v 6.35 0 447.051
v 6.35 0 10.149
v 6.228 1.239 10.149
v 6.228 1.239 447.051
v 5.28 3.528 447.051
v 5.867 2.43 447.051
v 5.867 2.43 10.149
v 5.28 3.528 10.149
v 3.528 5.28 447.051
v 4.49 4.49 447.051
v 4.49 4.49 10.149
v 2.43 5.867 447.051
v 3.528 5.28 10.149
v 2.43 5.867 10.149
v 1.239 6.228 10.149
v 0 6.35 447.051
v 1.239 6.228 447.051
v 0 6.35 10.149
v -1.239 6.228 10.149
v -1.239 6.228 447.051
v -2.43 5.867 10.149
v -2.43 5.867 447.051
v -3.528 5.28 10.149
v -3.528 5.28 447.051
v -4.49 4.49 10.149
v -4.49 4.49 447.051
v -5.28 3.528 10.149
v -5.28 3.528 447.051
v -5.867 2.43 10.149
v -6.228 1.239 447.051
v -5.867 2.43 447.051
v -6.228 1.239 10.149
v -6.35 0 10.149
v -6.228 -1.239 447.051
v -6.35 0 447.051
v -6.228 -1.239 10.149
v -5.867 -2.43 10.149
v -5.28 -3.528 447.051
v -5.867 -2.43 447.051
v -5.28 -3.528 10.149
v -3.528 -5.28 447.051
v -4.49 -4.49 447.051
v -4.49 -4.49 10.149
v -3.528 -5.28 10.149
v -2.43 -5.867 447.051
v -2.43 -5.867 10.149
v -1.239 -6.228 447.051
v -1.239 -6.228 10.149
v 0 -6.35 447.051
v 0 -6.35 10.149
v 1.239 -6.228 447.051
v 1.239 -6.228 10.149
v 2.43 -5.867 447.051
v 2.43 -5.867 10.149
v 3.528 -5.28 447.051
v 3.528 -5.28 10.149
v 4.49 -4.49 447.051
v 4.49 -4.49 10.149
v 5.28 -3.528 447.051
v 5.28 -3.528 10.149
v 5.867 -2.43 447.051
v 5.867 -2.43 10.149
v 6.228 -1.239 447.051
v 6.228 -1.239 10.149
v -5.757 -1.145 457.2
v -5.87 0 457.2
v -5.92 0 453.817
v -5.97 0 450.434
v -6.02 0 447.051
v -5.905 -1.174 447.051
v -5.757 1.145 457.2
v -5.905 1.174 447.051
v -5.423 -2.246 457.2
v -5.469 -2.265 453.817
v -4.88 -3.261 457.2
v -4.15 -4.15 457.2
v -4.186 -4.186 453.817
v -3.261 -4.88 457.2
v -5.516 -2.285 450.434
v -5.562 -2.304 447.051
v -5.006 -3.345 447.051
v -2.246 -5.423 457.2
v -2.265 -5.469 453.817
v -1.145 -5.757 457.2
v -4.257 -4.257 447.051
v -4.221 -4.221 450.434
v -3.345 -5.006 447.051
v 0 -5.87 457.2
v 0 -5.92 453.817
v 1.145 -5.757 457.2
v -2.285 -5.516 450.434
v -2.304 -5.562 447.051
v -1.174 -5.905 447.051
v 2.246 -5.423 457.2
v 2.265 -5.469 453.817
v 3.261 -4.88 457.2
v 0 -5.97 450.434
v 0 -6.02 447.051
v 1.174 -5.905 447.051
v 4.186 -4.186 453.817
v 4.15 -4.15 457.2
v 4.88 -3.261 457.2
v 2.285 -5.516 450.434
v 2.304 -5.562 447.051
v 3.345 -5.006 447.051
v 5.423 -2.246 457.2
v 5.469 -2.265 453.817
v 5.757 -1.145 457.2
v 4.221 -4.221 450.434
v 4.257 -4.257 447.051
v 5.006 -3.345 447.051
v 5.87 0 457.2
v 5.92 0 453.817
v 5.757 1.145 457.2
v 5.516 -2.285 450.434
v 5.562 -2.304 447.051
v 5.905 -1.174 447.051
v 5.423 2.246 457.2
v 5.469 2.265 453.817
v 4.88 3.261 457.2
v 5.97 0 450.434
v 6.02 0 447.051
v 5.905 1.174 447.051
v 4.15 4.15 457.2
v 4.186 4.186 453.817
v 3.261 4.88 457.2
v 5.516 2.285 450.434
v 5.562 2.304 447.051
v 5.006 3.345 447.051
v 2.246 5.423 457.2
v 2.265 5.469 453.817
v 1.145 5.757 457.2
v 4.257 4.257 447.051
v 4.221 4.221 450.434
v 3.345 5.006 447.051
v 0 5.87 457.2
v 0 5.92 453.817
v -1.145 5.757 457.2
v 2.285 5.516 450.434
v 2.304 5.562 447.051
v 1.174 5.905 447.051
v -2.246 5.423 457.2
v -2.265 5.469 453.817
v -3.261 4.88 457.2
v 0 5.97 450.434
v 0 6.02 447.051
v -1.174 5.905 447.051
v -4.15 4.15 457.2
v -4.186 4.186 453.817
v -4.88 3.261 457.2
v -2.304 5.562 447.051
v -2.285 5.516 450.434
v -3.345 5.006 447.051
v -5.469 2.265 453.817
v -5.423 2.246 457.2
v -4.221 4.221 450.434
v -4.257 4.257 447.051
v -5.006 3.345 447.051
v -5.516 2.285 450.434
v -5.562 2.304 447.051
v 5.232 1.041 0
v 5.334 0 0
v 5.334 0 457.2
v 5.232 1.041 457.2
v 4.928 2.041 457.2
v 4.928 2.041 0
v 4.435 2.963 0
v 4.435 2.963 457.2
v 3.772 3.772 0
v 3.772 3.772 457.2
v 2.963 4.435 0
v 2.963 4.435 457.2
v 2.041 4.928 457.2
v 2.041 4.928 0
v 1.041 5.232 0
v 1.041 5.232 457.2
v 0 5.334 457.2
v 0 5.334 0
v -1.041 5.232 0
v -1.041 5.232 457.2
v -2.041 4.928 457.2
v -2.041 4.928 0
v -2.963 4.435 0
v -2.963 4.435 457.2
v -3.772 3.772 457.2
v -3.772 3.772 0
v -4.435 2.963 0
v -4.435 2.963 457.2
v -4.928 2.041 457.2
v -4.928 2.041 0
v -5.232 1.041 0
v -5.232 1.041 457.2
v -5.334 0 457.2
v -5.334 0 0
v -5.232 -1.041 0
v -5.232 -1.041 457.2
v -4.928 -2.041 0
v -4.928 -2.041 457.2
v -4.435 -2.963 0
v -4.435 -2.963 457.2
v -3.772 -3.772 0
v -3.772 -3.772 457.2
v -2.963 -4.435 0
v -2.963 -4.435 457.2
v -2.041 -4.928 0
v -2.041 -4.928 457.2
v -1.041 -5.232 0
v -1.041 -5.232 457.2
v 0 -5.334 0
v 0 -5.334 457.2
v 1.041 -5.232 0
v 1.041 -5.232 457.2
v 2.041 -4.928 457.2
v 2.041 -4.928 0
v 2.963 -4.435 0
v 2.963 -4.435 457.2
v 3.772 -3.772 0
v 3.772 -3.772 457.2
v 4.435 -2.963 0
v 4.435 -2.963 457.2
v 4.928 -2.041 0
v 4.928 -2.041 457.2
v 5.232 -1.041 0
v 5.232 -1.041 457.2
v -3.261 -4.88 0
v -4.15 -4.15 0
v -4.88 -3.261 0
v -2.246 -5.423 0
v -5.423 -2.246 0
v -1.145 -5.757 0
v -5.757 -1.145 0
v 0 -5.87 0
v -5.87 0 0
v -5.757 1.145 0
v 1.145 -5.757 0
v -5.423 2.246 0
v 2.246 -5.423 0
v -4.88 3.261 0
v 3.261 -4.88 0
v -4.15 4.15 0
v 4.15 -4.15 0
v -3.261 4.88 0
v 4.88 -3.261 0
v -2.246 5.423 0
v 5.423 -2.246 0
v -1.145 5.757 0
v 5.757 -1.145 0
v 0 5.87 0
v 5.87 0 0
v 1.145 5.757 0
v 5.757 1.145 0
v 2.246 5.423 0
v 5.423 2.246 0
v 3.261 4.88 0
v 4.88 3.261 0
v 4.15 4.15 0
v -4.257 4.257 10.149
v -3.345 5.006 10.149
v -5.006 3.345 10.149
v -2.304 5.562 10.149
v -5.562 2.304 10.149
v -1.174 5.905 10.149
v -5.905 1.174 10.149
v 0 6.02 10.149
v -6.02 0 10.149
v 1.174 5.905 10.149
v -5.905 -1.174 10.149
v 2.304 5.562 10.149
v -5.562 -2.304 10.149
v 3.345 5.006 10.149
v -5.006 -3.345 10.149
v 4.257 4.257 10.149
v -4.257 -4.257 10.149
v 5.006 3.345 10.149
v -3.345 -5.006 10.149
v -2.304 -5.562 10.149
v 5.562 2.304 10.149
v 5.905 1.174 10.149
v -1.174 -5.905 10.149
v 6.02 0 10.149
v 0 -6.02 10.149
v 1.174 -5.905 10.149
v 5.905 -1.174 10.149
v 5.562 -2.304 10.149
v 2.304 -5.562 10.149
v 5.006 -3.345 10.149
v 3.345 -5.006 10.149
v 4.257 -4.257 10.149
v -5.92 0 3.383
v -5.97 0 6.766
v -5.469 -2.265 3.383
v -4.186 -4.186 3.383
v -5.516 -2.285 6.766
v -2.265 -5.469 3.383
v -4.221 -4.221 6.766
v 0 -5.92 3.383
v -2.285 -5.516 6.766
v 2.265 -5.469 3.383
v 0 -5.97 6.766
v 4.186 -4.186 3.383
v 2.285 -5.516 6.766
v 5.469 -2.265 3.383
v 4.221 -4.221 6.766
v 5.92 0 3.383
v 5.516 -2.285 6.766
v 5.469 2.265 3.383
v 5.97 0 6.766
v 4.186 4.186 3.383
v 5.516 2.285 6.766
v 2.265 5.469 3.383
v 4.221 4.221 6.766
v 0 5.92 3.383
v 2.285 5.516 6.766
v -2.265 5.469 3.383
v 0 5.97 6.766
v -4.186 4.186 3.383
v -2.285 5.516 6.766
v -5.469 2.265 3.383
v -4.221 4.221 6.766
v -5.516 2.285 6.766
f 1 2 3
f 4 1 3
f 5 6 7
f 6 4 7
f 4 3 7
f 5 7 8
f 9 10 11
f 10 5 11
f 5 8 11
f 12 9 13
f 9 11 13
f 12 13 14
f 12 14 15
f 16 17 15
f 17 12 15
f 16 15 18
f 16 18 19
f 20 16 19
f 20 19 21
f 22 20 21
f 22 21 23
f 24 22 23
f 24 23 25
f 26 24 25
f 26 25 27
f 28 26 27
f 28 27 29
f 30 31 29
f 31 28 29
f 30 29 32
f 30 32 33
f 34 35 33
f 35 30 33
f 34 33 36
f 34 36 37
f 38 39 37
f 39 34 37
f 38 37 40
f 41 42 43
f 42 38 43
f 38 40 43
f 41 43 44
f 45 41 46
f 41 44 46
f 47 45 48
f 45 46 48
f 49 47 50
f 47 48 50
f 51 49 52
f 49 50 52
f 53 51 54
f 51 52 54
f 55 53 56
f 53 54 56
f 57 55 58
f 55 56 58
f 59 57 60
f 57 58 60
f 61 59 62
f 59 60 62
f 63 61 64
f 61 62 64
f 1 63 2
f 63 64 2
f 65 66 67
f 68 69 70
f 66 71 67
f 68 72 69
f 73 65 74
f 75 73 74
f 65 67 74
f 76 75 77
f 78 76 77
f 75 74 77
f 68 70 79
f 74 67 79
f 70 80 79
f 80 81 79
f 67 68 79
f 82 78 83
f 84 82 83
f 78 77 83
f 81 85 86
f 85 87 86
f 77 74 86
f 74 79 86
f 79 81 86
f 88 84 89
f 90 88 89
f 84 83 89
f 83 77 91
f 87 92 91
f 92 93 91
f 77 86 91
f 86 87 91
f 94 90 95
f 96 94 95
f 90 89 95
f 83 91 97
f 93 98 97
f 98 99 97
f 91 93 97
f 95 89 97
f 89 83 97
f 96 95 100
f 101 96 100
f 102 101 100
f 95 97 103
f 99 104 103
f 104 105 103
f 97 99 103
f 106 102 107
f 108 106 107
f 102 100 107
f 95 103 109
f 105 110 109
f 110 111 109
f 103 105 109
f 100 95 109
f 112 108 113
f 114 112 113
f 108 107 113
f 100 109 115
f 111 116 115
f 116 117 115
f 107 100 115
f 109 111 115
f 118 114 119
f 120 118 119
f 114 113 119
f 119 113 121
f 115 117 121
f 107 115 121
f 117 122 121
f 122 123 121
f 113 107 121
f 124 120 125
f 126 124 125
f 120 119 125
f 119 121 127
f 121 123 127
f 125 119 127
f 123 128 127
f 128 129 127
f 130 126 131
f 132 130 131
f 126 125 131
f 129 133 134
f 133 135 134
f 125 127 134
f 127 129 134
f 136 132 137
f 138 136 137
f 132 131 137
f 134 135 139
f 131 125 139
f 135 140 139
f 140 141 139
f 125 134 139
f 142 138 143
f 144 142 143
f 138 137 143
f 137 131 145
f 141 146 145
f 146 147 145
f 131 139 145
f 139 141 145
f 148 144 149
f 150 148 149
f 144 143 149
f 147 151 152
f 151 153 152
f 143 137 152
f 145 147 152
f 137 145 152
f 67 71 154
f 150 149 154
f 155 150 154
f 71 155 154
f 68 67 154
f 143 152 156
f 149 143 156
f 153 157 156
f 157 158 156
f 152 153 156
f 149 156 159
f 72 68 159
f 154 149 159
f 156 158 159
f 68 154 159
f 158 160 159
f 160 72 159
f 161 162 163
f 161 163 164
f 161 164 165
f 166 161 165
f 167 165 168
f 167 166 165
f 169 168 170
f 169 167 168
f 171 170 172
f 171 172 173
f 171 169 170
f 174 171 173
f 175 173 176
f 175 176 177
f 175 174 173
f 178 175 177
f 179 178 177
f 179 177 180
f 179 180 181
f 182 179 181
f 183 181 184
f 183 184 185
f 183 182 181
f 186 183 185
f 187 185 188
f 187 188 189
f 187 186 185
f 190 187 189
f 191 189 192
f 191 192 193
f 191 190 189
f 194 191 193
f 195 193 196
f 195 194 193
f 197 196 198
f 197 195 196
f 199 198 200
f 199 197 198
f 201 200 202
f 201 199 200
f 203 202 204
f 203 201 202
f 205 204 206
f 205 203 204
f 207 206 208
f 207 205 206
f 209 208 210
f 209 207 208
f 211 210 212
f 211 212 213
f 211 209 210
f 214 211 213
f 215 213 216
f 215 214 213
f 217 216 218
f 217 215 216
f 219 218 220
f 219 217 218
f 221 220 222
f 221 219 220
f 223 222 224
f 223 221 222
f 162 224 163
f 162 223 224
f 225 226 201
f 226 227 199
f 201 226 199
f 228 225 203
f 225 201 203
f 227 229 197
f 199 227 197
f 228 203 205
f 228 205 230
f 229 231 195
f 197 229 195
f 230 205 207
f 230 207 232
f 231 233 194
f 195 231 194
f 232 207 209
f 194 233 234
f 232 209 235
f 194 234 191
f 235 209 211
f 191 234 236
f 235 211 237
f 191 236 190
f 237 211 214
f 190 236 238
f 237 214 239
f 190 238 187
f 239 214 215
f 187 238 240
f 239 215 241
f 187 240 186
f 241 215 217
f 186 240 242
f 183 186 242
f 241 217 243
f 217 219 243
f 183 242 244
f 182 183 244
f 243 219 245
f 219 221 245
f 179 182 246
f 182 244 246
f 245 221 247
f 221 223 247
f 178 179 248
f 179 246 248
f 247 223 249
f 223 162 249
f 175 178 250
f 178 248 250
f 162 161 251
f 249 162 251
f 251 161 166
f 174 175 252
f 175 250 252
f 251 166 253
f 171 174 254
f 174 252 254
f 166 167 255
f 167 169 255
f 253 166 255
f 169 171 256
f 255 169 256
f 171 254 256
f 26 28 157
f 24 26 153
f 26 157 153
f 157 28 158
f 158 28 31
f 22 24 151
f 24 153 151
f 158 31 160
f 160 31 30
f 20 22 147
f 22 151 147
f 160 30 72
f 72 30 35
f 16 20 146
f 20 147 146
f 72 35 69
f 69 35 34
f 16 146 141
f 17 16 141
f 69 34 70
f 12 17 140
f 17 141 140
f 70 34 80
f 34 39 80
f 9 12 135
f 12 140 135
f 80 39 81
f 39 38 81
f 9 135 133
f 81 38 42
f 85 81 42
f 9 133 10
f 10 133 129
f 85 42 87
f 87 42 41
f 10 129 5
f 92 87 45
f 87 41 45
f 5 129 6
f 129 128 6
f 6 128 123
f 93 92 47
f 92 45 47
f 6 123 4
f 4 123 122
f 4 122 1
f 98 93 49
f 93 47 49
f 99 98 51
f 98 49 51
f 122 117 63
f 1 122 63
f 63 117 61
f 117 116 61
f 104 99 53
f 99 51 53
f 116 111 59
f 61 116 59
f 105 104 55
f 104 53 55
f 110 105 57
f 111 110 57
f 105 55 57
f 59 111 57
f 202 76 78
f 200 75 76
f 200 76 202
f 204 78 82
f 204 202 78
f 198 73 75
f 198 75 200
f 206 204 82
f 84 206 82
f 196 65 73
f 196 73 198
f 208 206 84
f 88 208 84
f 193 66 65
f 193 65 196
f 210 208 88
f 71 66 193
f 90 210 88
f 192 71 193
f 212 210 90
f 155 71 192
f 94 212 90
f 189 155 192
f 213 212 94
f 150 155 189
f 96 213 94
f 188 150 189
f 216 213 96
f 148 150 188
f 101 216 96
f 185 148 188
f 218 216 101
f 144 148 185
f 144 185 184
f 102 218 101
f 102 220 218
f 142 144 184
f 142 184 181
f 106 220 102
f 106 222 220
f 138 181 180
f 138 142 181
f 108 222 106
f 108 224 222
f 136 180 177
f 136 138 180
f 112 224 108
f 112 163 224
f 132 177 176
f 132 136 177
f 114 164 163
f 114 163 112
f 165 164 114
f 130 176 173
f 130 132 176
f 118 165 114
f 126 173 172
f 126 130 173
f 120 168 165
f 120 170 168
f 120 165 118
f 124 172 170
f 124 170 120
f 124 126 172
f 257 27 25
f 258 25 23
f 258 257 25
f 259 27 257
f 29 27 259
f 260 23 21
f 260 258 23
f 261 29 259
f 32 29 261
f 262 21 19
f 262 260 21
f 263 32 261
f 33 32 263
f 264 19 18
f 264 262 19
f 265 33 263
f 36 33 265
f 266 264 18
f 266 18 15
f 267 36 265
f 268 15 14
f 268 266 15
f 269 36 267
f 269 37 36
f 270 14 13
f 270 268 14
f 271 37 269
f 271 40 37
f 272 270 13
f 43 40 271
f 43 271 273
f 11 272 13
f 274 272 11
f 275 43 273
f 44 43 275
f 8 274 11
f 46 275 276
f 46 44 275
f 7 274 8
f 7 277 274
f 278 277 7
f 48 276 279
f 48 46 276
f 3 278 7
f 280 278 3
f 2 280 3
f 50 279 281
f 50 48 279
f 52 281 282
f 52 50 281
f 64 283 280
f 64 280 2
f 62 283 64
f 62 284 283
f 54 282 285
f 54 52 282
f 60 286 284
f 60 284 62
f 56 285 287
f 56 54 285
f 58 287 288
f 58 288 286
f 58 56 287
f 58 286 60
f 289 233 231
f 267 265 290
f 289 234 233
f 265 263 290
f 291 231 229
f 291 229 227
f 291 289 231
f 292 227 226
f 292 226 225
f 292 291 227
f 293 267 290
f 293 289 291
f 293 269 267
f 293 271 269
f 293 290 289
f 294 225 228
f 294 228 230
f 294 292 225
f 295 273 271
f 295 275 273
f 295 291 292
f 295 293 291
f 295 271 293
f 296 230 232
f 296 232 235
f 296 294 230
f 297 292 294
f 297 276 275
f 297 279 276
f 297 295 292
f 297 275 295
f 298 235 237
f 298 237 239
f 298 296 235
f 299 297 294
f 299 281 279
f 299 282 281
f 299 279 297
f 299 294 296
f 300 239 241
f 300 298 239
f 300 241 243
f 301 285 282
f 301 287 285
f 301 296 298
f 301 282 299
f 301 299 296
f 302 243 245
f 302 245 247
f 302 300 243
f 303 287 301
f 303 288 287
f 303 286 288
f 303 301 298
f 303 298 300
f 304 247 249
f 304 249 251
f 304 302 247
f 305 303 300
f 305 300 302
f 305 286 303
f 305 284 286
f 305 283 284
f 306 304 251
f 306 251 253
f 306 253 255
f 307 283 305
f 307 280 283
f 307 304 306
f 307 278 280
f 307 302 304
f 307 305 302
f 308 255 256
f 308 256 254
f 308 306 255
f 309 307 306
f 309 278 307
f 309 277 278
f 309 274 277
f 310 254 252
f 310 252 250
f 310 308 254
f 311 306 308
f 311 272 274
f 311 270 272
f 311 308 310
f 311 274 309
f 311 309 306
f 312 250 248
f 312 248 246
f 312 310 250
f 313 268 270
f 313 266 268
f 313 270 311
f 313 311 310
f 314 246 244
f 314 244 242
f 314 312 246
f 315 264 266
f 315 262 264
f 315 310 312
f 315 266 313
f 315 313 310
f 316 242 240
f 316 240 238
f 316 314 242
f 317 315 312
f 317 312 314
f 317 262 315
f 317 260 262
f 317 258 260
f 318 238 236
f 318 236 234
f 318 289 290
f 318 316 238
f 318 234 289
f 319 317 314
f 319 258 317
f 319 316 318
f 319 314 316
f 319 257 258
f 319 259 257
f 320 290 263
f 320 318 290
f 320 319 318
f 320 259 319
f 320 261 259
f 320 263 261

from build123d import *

# Parameters (mm, degrees)
SKETCH2_R           = 6.35
SKETCH2_R_2         = 5.334
BOSS_EXTRUDE1_DEPTH = 457.2


with BuildPart() as part:
    # Sketch2 → Boss-Extrude1 (new body)
    with BuildSketch(Plane.XY):
        Circle(SKETCH2_R)
        Circle(SKETCH2_R_2, mode=Mode.SUBTRACT)
    extrude(amount=BOSS_EXTRUDE1_DEPTH)

    # Sketch3 → Cut-Revolve3 (revolve, cut)
    with BuildSketch(Plane(origin=(0, 0, 0), x_dir=(0, 0, -1), z_dir=(1, 0, 0)), mode=Mode.PRIVATE) as cut_revolve3_sk:
        Polygon((-457.2, 8.954277603), (-457.2, 5.869613211), (-447.050584192, 6.020223087), (-447.050584192, 8.954277603), align=None)
        Polygon((-10.149415808, 8.954277603), (0, 8.954277603), (0, 5.869613211), (-10.149415808, 6.020223087), align=None)
    revolve(cut_revolve3_sk.sketch.rotate(Axis((0, 0, 0), (0, 0, 1)), 90), axis=Axis((0, 0, 0), (0, 0, 1)), mode=Mode.SUBTRACT)


solid = part.part
